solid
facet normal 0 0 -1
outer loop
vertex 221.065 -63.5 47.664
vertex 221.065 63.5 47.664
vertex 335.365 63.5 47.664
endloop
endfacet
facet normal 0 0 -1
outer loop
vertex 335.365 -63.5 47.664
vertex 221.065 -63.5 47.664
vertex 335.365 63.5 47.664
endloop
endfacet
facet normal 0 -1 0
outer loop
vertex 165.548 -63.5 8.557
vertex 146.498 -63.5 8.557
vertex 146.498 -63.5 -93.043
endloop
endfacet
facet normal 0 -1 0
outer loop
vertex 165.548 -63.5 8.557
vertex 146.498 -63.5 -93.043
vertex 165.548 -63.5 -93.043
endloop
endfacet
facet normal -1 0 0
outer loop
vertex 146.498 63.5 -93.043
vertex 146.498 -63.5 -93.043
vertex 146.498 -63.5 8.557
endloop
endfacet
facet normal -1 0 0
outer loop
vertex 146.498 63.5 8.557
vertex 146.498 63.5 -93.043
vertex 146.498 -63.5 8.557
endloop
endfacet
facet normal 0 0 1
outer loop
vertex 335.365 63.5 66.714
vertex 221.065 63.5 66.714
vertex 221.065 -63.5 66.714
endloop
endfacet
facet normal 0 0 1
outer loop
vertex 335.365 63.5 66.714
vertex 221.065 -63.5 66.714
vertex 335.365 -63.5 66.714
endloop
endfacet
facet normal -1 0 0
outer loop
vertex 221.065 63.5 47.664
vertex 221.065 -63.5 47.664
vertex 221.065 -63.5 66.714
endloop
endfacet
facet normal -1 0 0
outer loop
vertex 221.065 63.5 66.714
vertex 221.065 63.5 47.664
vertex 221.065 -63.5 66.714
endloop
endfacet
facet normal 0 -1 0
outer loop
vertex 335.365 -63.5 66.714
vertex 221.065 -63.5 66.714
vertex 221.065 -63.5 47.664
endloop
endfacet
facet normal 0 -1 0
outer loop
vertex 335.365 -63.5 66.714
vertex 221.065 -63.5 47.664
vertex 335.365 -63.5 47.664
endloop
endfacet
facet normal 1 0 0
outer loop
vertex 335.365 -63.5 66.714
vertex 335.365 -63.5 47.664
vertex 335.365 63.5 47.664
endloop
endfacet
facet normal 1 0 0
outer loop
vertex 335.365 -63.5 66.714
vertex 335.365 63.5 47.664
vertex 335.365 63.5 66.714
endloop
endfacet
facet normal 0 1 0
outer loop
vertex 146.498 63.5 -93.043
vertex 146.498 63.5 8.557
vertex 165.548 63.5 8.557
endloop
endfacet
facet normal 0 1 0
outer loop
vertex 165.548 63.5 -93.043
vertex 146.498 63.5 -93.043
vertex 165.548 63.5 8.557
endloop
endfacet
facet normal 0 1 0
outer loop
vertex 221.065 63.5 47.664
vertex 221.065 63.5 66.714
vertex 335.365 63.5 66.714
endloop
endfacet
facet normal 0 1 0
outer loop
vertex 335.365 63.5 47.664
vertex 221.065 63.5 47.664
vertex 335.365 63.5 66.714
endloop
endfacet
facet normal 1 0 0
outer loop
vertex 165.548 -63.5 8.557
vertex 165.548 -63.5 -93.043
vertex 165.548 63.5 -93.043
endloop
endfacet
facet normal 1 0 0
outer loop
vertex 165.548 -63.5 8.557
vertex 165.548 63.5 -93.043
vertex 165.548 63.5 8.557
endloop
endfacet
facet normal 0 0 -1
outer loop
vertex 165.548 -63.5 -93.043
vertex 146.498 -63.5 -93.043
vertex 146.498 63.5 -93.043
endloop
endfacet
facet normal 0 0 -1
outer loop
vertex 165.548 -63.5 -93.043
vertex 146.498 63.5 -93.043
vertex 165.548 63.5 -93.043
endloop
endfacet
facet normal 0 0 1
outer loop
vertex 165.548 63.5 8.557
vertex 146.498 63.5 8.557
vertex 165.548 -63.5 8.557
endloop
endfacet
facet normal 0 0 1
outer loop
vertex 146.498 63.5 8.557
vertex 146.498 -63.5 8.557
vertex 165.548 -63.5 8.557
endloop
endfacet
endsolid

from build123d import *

# Parameters (mm, degrees)
F0_W     = 19.05
F0_H     = 101.6
F1_DEPTH = 63.5
F2_W     = 114.3
F2_H     = 19.05
F3_DEPTH = 63.5


with BuildPart() as f1:
    # F0 (on Front) → F1 (new body, symmetric)
    with BuildSketch(Plane.XZ):
        with Locations((156.023299, -42.243243)):
            Rectangle(F0_W, F0_H)
    extrude(amount=F1_DEPTH, both=True)


with BuildPart() as f3:
    # F2 (on Front) → F3 (new body, symmetric)
    with BuildSketch(Plane.XZ):
        with Locations((278.21508, 57.188717)):
            Rectangle(F2_W, F2_H)
    extrude(amount=F3_DEPTH, both=True)


solid = Compound([f1.part, f3.part])
